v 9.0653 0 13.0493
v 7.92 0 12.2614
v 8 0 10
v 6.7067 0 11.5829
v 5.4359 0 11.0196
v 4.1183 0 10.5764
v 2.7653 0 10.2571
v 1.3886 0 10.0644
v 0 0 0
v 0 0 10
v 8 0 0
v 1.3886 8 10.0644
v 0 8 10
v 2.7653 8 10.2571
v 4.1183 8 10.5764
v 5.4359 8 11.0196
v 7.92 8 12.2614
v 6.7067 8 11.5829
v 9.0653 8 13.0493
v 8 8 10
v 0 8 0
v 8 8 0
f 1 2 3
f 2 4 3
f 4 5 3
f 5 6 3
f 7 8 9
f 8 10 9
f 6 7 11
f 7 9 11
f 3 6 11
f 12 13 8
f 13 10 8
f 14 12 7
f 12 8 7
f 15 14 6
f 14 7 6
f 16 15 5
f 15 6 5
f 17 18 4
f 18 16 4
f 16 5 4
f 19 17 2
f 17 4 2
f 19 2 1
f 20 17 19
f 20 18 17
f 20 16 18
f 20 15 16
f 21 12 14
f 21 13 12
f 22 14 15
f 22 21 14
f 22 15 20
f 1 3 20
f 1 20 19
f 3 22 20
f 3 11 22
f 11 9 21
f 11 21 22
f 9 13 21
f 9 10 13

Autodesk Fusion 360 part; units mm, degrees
sketch "Sketch1" plane through (0, 0, 0) normal (0, 1, 0) x (1, 0, 0)
  line L0 (0, 0) -> (8, 0)
  line L1 (8, 0) -> (8, -10)
  line L2 (0, -10) -> (0, 0)
  line L3 (8, -10) -> (9.0653, -13.0493)
  arc A0 (9.0653, -13.0493) -> (0, -10) centre (0, -25) ccw
extrude "Extrude1" add sketch "Sketch1" along normal blind 8
